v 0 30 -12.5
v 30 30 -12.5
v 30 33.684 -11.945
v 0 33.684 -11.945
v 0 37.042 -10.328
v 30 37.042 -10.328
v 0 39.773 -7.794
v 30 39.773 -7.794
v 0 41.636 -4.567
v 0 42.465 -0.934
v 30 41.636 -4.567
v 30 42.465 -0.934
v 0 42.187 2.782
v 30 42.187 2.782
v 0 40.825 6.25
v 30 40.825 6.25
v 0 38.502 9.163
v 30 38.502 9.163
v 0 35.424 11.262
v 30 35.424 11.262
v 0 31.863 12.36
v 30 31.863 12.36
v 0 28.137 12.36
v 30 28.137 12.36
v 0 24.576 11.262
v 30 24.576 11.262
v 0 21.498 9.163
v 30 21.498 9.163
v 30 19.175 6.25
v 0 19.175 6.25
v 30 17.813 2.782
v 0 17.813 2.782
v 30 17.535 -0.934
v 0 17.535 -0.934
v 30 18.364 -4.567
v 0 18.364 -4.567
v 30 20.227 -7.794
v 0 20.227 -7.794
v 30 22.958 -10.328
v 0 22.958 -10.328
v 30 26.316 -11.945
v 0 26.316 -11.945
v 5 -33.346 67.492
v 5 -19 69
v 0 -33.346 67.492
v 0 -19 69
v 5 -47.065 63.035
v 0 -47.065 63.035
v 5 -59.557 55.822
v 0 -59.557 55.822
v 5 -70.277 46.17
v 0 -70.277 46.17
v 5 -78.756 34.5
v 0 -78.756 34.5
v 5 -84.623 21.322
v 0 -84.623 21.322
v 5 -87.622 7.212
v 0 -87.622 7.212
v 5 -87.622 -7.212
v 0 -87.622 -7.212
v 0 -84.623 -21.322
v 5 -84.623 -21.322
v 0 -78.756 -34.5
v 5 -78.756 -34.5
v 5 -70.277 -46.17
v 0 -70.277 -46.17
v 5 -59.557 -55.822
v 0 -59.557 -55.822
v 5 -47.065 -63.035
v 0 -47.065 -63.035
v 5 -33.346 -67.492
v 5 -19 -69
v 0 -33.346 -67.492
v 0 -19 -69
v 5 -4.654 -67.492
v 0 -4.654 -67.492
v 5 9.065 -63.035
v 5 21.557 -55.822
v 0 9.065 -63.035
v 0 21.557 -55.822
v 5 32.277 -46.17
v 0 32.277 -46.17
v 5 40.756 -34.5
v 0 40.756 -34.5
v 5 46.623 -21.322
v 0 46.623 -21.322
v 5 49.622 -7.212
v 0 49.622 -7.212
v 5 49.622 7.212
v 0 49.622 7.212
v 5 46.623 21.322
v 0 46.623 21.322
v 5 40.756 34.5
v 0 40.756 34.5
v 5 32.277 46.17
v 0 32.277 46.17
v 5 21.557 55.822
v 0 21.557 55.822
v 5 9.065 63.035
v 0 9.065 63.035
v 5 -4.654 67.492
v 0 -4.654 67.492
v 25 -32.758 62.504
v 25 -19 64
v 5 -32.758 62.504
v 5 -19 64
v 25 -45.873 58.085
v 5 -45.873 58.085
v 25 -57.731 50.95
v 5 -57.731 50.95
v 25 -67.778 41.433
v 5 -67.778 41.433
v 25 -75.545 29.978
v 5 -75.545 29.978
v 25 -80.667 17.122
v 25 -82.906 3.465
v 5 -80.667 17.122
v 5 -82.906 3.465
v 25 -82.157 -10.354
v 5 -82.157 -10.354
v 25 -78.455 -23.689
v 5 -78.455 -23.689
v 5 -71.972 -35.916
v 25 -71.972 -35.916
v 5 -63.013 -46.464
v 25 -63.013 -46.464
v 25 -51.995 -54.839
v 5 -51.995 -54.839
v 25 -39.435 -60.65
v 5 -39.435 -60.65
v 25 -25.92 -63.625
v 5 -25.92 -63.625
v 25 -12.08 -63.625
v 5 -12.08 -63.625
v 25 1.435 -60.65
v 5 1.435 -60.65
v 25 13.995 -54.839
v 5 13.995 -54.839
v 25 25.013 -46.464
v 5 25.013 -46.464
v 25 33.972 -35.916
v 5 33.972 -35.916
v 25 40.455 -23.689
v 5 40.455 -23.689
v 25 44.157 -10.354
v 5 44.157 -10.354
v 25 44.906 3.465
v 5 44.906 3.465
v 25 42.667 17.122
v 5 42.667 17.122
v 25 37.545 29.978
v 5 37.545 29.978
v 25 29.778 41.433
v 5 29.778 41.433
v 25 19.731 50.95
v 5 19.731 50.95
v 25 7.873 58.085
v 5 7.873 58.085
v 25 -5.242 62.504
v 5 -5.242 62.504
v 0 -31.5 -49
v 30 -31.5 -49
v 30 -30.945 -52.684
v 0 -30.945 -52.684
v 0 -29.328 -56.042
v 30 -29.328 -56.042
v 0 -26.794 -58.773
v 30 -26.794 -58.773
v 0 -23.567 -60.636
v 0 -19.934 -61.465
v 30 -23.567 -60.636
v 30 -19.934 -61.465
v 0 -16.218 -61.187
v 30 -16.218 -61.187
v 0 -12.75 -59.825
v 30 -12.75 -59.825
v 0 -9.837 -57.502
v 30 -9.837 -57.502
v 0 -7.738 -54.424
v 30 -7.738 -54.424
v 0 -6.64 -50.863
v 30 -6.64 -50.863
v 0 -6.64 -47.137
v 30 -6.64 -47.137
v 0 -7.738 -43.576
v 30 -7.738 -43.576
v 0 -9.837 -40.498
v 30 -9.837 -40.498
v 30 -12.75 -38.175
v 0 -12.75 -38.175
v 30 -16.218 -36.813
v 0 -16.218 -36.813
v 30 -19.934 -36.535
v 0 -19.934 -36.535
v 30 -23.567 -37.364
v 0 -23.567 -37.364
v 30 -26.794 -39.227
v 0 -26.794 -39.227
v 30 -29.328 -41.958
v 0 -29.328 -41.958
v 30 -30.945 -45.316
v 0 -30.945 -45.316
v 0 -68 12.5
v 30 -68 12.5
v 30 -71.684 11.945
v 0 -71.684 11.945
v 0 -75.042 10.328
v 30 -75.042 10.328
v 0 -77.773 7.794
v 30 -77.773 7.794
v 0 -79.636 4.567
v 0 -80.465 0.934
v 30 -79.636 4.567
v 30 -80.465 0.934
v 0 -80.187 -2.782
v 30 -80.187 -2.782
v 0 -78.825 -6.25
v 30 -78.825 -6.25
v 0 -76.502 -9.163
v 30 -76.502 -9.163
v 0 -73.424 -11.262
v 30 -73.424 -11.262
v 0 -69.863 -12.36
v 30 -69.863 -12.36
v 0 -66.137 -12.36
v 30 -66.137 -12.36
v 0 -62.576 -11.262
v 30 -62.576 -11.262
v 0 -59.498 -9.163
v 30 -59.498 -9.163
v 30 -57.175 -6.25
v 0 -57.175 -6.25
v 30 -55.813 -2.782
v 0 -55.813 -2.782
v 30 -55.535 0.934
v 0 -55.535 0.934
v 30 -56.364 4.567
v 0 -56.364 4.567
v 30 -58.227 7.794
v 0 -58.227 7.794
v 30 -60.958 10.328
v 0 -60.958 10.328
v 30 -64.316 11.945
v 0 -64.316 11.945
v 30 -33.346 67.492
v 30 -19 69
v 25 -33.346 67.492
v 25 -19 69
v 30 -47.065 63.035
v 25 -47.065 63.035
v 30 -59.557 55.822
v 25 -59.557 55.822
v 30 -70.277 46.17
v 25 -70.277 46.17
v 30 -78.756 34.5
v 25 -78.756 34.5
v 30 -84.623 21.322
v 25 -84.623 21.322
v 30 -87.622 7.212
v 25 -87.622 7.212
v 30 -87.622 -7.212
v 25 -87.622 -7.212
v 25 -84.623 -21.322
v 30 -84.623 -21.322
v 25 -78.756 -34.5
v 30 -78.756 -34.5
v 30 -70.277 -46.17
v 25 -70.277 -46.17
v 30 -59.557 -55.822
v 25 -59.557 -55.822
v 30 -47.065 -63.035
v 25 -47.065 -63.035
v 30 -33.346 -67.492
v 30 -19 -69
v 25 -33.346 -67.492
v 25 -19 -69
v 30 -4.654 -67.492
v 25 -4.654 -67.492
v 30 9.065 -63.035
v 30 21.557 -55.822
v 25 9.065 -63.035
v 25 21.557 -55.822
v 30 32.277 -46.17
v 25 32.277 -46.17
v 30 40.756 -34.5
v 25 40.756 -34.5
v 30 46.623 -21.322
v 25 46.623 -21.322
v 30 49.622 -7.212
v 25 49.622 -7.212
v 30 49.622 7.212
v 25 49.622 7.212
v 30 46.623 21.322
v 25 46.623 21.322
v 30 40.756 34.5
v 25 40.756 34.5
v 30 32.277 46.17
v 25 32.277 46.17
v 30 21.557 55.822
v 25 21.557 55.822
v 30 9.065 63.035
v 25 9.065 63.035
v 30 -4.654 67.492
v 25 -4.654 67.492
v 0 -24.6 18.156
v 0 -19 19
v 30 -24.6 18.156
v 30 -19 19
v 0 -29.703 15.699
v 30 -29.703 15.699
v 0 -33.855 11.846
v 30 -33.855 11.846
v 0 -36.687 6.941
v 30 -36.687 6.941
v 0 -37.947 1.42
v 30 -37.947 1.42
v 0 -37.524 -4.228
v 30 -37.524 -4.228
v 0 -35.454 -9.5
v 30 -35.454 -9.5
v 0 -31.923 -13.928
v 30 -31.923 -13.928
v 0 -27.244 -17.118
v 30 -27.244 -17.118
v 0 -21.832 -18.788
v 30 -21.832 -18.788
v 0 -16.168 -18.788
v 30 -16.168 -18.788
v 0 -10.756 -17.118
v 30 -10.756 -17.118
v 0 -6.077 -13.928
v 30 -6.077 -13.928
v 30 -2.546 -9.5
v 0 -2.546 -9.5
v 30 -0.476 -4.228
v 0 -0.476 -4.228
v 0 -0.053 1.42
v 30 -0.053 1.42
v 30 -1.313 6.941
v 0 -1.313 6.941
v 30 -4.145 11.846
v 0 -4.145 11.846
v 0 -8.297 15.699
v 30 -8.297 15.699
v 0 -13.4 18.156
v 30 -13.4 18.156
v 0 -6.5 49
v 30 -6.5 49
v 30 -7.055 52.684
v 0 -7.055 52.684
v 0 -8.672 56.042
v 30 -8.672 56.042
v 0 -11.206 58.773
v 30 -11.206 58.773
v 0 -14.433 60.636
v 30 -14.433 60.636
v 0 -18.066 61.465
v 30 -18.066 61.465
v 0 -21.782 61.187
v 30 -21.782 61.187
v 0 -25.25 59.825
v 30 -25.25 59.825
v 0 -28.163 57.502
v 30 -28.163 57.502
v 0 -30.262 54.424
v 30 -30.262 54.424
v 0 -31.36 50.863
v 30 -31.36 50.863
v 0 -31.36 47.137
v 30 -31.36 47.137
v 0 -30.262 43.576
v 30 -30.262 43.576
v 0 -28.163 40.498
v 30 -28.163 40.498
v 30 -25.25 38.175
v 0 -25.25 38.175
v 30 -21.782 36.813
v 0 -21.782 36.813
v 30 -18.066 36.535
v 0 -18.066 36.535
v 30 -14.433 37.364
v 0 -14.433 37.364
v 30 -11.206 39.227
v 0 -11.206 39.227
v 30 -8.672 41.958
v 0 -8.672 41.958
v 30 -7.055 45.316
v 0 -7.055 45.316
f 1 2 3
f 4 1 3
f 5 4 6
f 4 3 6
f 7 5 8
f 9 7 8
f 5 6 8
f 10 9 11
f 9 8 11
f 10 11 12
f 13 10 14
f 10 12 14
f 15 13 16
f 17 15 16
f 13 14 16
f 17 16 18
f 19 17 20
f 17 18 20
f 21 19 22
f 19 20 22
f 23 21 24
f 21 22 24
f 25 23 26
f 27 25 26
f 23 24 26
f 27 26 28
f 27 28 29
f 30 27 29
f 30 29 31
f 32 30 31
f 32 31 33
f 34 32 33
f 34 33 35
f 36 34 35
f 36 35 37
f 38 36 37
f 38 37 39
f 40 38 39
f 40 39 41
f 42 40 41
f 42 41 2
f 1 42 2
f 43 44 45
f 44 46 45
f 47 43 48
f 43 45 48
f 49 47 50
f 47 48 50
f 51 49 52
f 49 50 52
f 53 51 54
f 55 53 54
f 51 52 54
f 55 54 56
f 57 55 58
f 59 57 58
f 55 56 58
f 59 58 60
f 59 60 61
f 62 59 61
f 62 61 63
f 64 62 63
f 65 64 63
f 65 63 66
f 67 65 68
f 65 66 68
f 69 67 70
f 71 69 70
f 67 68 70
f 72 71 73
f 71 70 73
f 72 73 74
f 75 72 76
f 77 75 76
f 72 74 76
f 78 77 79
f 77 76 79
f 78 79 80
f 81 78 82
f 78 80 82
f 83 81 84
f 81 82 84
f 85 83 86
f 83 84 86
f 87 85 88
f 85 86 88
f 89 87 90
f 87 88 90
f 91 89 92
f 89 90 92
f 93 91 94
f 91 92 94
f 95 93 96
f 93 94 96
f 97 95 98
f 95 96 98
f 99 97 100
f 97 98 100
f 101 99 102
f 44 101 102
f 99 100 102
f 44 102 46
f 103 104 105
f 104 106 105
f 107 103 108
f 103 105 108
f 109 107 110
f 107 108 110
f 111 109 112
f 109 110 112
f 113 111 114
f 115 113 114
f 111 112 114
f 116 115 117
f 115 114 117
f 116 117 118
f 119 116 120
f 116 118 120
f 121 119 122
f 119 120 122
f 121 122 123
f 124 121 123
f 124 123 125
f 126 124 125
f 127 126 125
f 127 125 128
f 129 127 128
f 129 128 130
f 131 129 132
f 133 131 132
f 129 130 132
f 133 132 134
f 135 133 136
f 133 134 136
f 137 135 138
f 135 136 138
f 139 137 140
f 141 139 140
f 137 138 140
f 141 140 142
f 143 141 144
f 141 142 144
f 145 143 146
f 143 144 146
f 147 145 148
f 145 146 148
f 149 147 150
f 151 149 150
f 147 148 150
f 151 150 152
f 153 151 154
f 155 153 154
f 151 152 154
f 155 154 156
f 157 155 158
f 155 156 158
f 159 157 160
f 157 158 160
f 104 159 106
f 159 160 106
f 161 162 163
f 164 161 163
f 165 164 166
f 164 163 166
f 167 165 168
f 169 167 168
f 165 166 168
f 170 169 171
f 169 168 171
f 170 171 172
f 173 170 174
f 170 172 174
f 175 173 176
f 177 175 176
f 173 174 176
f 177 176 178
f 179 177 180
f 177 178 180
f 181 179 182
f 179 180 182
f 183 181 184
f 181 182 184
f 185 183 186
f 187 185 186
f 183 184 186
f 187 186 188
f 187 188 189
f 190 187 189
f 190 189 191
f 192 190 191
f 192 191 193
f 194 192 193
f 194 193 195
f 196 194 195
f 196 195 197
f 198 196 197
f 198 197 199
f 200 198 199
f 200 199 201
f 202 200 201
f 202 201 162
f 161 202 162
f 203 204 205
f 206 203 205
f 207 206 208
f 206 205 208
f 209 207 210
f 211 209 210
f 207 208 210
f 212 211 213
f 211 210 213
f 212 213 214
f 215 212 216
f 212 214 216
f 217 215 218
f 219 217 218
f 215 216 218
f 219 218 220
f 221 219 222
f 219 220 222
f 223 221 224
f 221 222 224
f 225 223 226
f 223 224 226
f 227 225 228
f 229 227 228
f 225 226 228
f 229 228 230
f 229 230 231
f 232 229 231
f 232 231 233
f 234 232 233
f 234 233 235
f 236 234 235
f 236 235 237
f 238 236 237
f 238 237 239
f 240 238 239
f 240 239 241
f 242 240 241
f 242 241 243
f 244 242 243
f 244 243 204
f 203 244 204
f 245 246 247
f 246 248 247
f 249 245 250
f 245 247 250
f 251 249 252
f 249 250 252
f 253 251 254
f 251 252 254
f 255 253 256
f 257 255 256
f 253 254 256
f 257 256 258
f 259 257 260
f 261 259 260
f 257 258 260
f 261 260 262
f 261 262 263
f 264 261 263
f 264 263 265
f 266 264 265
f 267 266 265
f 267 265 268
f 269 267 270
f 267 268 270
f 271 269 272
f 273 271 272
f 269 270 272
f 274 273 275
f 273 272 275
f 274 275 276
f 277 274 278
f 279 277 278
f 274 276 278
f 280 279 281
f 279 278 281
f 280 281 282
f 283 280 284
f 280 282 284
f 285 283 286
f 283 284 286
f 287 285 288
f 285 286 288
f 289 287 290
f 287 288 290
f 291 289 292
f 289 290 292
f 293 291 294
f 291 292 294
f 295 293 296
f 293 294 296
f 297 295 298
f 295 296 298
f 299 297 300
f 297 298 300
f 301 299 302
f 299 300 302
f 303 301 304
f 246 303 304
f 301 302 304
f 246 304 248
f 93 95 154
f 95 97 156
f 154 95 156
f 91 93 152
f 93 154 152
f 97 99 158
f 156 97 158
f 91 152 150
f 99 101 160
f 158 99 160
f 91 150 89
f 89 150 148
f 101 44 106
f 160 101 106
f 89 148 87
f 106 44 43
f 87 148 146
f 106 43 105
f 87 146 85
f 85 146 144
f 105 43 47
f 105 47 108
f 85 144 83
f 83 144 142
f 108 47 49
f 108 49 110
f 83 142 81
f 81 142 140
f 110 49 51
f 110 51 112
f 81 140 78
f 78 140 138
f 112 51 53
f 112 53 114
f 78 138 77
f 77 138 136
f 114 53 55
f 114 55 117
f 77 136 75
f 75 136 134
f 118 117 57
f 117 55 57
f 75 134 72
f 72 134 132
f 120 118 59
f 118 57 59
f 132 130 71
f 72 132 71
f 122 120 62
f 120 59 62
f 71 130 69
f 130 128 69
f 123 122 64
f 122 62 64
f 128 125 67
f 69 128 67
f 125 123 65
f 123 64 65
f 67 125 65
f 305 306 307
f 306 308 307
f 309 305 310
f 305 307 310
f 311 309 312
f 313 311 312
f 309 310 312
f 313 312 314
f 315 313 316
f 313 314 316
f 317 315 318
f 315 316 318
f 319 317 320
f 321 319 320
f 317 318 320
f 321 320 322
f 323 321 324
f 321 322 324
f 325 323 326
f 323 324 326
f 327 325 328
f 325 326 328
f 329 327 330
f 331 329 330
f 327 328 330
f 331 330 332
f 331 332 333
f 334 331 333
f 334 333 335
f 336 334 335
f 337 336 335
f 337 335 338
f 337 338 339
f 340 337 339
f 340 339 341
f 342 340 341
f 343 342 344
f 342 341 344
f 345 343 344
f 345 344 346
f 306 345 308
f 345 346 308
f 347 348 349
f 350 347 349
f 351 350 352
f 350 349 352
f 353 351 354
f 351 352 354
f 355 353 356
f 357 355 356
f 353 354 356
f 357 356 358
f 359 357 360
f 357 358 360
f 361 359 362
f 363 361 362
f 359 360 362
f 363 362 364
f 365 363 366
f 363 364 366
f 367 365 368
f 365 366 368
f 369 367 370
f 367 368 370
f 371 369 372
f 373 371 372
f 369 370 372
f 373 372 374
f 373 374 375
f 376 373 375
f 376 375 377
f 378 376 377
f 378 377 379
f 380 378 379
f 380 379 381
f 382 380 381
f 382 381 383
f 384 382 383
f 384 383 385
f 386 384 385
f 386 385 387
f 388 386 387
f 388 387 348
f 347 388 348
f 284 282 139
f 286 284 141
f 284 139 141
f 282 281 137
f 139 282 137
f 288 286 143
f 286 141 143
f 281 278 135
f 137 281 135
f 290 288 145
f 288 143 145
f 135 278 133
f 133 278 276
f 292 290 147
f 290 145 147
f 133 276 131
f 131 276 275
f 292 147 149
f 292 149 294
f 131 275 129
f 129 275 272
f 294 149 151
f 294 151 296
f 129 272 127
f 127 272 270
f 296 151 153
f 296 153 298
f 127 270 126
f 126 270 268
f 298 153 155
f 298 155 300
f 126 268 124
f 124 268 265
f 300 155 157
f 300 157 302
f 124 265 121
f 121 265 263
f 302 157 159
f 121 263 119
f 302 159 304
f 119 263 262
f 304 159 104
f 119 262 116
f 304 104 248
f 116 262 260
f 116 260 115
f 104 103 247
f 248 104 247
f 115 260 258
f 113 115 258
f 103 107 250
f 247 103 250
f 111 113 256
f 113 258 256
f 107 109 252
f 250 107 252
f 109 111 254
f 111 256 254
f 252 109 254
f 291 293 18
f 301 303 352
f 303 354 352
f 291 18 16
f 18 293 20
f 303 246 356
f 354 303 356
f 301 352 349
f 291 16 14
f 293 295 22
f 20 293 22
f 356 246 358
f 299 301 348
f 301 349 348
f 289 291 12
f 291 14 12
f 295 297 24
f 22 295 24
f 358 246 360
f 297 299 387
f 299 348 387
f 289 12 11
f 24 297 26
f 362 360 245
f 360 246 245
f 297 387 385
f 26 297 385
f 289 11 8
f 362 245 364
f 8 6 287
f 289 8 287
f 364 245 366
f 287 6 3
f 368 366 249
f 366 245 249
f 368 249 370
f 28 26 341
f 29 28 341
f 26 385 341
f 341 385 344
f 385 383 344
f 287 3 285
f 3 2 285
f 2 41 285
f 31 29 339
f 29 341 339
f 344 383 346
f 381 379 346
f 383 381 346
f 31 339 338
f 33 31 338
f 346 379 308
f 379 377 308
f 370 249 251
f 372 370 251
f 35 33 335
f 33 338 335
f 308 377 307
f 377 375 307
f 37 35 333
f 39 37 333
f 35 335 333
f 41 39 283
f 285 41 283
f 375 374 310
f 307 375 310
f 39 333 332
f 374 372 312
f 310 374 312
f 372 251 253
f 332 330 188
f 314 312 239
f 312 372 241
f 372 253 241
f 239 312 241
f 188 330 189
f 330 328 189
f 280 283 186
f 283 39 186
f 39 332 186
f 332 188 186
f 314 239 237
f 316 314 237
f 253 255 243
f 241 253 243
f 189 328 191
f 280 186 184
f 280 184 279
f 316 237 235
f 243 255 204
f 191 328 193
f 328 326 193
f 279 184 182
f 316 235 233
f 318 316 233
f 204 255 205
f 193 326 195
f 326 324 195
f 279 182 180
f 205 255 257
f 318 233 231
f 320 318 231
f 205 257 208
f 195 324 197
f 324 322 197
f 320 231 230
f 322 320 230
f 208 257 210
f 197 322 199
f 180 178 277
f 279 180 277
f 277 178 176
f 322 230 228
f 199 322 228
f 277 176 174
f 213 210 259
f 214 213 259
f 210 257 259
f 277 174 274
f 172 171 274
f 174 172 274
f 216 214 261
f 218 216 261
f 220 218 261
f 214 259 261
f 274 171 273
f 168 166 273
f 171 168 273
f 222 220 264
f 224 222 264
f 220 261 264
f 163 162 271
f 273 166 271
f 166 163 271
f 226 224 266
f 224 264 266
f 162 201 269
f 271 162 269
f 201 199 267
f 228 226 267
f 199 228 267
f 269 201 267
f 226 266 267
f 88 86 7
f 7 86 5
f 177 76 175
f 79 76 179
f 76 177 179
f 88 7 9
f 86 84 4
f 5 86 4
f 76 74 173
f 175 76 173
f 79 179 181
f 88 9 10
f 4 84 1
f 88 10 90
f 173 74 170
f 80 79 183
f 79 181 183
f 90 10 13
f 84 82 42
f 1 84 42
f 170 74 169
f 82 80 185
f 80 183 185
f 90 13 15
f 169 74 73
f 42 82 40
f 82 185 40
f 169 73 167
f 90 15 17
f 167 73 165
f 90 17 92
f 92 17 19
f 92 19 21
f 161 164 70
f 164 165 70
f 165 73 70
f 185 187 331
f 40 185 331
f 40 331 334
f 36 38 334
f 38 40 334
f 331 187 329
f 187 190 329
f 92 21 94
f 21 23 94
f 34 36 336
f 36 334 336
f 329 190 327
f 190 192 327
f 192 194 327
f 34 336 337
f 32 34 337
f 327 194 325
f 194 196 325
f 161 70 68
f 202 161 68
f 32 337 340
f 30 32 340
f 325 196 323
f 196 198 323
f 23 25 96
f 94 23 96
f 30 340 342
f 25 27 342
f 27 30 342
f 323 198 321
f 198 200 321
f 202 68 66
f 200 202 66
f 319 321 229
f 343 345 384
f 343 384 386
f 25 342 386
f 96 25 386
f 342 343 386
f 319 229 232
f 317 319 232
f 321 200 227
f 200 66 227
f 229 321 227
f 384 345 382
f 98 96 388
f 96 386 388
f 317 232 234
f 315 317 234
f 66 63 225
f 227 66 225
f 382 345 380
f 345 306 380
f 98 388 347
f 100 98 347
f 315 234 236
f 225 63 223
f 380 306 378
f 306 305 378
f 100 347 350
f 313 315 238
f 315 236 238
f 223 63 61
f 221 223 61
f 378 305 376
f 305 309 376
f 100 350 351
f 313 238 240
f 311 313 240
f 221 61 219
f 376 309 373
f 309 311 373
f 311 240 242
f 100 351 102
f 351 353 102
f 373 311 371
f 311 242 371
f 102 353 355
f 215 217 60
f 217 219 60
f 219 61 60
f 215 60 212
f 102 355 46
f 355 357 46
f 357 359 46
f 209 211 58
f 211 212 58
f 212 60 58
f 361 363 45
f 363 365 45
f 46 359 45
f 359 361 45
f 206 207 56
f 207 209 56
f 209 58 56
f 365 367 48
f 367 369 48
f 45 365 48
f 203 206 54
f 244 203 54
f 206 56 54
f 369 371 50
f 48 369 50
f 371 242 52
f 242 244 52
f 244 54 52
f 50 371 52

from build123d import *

# Parameters (mm, degrees)
SKETCH2_R          = 12.5
CUT_EXTRUDE1_DEPTH = 116.779963724
CIRPATTERN1_COUNT  = 4


with BuildPart() as part:
    # Sketch1 → Revolve1 (revolve)
    with BuildSketch(Plane.XY, mode=Mode.PRIVATE) as revolve1_sk:
        Polygon((0, 0), (30, 0), (30, 50), (25, 50), (25, 45), (5, 45), (5, 50), (0, 50), align=None)
    revolve(revolve1_sk.sketch.rotate(Axis((-128.92900602, -19, 0), (1, 0, 0)), 90), axis=Axis((-128.92900602, -19, 0), (1, 0, 0)))

    # Sketch2 → Cut-Extrude1 (cut, through all)
    with BuildSketch(Plane(origin=(30, 0, 0), x_dir=(0, 0, -1), z_dir=(1, 0, 0))):
        with Locations((0, 30)):
            Circle(SKETCH2_R)
    cut_extrude1 = extrude(amount=-CUT_EXTRUDE1_DEPTH, mode=Mode.SUBTRACT)

    # CirPattern1: Cut-Extrude1 ×4 about axis
    cirpattern1_axis = Axis((0, -19, 0), (1, 0, 0))
    for i in range(1, CIRPATTERN1_COUNT):
        add(cut_extrude1.rotate(cirpattern1_axis, i * 360 / CIRPATTERN1_COUNT), mode=Mode.SUBTRACT)


solid = part.part
